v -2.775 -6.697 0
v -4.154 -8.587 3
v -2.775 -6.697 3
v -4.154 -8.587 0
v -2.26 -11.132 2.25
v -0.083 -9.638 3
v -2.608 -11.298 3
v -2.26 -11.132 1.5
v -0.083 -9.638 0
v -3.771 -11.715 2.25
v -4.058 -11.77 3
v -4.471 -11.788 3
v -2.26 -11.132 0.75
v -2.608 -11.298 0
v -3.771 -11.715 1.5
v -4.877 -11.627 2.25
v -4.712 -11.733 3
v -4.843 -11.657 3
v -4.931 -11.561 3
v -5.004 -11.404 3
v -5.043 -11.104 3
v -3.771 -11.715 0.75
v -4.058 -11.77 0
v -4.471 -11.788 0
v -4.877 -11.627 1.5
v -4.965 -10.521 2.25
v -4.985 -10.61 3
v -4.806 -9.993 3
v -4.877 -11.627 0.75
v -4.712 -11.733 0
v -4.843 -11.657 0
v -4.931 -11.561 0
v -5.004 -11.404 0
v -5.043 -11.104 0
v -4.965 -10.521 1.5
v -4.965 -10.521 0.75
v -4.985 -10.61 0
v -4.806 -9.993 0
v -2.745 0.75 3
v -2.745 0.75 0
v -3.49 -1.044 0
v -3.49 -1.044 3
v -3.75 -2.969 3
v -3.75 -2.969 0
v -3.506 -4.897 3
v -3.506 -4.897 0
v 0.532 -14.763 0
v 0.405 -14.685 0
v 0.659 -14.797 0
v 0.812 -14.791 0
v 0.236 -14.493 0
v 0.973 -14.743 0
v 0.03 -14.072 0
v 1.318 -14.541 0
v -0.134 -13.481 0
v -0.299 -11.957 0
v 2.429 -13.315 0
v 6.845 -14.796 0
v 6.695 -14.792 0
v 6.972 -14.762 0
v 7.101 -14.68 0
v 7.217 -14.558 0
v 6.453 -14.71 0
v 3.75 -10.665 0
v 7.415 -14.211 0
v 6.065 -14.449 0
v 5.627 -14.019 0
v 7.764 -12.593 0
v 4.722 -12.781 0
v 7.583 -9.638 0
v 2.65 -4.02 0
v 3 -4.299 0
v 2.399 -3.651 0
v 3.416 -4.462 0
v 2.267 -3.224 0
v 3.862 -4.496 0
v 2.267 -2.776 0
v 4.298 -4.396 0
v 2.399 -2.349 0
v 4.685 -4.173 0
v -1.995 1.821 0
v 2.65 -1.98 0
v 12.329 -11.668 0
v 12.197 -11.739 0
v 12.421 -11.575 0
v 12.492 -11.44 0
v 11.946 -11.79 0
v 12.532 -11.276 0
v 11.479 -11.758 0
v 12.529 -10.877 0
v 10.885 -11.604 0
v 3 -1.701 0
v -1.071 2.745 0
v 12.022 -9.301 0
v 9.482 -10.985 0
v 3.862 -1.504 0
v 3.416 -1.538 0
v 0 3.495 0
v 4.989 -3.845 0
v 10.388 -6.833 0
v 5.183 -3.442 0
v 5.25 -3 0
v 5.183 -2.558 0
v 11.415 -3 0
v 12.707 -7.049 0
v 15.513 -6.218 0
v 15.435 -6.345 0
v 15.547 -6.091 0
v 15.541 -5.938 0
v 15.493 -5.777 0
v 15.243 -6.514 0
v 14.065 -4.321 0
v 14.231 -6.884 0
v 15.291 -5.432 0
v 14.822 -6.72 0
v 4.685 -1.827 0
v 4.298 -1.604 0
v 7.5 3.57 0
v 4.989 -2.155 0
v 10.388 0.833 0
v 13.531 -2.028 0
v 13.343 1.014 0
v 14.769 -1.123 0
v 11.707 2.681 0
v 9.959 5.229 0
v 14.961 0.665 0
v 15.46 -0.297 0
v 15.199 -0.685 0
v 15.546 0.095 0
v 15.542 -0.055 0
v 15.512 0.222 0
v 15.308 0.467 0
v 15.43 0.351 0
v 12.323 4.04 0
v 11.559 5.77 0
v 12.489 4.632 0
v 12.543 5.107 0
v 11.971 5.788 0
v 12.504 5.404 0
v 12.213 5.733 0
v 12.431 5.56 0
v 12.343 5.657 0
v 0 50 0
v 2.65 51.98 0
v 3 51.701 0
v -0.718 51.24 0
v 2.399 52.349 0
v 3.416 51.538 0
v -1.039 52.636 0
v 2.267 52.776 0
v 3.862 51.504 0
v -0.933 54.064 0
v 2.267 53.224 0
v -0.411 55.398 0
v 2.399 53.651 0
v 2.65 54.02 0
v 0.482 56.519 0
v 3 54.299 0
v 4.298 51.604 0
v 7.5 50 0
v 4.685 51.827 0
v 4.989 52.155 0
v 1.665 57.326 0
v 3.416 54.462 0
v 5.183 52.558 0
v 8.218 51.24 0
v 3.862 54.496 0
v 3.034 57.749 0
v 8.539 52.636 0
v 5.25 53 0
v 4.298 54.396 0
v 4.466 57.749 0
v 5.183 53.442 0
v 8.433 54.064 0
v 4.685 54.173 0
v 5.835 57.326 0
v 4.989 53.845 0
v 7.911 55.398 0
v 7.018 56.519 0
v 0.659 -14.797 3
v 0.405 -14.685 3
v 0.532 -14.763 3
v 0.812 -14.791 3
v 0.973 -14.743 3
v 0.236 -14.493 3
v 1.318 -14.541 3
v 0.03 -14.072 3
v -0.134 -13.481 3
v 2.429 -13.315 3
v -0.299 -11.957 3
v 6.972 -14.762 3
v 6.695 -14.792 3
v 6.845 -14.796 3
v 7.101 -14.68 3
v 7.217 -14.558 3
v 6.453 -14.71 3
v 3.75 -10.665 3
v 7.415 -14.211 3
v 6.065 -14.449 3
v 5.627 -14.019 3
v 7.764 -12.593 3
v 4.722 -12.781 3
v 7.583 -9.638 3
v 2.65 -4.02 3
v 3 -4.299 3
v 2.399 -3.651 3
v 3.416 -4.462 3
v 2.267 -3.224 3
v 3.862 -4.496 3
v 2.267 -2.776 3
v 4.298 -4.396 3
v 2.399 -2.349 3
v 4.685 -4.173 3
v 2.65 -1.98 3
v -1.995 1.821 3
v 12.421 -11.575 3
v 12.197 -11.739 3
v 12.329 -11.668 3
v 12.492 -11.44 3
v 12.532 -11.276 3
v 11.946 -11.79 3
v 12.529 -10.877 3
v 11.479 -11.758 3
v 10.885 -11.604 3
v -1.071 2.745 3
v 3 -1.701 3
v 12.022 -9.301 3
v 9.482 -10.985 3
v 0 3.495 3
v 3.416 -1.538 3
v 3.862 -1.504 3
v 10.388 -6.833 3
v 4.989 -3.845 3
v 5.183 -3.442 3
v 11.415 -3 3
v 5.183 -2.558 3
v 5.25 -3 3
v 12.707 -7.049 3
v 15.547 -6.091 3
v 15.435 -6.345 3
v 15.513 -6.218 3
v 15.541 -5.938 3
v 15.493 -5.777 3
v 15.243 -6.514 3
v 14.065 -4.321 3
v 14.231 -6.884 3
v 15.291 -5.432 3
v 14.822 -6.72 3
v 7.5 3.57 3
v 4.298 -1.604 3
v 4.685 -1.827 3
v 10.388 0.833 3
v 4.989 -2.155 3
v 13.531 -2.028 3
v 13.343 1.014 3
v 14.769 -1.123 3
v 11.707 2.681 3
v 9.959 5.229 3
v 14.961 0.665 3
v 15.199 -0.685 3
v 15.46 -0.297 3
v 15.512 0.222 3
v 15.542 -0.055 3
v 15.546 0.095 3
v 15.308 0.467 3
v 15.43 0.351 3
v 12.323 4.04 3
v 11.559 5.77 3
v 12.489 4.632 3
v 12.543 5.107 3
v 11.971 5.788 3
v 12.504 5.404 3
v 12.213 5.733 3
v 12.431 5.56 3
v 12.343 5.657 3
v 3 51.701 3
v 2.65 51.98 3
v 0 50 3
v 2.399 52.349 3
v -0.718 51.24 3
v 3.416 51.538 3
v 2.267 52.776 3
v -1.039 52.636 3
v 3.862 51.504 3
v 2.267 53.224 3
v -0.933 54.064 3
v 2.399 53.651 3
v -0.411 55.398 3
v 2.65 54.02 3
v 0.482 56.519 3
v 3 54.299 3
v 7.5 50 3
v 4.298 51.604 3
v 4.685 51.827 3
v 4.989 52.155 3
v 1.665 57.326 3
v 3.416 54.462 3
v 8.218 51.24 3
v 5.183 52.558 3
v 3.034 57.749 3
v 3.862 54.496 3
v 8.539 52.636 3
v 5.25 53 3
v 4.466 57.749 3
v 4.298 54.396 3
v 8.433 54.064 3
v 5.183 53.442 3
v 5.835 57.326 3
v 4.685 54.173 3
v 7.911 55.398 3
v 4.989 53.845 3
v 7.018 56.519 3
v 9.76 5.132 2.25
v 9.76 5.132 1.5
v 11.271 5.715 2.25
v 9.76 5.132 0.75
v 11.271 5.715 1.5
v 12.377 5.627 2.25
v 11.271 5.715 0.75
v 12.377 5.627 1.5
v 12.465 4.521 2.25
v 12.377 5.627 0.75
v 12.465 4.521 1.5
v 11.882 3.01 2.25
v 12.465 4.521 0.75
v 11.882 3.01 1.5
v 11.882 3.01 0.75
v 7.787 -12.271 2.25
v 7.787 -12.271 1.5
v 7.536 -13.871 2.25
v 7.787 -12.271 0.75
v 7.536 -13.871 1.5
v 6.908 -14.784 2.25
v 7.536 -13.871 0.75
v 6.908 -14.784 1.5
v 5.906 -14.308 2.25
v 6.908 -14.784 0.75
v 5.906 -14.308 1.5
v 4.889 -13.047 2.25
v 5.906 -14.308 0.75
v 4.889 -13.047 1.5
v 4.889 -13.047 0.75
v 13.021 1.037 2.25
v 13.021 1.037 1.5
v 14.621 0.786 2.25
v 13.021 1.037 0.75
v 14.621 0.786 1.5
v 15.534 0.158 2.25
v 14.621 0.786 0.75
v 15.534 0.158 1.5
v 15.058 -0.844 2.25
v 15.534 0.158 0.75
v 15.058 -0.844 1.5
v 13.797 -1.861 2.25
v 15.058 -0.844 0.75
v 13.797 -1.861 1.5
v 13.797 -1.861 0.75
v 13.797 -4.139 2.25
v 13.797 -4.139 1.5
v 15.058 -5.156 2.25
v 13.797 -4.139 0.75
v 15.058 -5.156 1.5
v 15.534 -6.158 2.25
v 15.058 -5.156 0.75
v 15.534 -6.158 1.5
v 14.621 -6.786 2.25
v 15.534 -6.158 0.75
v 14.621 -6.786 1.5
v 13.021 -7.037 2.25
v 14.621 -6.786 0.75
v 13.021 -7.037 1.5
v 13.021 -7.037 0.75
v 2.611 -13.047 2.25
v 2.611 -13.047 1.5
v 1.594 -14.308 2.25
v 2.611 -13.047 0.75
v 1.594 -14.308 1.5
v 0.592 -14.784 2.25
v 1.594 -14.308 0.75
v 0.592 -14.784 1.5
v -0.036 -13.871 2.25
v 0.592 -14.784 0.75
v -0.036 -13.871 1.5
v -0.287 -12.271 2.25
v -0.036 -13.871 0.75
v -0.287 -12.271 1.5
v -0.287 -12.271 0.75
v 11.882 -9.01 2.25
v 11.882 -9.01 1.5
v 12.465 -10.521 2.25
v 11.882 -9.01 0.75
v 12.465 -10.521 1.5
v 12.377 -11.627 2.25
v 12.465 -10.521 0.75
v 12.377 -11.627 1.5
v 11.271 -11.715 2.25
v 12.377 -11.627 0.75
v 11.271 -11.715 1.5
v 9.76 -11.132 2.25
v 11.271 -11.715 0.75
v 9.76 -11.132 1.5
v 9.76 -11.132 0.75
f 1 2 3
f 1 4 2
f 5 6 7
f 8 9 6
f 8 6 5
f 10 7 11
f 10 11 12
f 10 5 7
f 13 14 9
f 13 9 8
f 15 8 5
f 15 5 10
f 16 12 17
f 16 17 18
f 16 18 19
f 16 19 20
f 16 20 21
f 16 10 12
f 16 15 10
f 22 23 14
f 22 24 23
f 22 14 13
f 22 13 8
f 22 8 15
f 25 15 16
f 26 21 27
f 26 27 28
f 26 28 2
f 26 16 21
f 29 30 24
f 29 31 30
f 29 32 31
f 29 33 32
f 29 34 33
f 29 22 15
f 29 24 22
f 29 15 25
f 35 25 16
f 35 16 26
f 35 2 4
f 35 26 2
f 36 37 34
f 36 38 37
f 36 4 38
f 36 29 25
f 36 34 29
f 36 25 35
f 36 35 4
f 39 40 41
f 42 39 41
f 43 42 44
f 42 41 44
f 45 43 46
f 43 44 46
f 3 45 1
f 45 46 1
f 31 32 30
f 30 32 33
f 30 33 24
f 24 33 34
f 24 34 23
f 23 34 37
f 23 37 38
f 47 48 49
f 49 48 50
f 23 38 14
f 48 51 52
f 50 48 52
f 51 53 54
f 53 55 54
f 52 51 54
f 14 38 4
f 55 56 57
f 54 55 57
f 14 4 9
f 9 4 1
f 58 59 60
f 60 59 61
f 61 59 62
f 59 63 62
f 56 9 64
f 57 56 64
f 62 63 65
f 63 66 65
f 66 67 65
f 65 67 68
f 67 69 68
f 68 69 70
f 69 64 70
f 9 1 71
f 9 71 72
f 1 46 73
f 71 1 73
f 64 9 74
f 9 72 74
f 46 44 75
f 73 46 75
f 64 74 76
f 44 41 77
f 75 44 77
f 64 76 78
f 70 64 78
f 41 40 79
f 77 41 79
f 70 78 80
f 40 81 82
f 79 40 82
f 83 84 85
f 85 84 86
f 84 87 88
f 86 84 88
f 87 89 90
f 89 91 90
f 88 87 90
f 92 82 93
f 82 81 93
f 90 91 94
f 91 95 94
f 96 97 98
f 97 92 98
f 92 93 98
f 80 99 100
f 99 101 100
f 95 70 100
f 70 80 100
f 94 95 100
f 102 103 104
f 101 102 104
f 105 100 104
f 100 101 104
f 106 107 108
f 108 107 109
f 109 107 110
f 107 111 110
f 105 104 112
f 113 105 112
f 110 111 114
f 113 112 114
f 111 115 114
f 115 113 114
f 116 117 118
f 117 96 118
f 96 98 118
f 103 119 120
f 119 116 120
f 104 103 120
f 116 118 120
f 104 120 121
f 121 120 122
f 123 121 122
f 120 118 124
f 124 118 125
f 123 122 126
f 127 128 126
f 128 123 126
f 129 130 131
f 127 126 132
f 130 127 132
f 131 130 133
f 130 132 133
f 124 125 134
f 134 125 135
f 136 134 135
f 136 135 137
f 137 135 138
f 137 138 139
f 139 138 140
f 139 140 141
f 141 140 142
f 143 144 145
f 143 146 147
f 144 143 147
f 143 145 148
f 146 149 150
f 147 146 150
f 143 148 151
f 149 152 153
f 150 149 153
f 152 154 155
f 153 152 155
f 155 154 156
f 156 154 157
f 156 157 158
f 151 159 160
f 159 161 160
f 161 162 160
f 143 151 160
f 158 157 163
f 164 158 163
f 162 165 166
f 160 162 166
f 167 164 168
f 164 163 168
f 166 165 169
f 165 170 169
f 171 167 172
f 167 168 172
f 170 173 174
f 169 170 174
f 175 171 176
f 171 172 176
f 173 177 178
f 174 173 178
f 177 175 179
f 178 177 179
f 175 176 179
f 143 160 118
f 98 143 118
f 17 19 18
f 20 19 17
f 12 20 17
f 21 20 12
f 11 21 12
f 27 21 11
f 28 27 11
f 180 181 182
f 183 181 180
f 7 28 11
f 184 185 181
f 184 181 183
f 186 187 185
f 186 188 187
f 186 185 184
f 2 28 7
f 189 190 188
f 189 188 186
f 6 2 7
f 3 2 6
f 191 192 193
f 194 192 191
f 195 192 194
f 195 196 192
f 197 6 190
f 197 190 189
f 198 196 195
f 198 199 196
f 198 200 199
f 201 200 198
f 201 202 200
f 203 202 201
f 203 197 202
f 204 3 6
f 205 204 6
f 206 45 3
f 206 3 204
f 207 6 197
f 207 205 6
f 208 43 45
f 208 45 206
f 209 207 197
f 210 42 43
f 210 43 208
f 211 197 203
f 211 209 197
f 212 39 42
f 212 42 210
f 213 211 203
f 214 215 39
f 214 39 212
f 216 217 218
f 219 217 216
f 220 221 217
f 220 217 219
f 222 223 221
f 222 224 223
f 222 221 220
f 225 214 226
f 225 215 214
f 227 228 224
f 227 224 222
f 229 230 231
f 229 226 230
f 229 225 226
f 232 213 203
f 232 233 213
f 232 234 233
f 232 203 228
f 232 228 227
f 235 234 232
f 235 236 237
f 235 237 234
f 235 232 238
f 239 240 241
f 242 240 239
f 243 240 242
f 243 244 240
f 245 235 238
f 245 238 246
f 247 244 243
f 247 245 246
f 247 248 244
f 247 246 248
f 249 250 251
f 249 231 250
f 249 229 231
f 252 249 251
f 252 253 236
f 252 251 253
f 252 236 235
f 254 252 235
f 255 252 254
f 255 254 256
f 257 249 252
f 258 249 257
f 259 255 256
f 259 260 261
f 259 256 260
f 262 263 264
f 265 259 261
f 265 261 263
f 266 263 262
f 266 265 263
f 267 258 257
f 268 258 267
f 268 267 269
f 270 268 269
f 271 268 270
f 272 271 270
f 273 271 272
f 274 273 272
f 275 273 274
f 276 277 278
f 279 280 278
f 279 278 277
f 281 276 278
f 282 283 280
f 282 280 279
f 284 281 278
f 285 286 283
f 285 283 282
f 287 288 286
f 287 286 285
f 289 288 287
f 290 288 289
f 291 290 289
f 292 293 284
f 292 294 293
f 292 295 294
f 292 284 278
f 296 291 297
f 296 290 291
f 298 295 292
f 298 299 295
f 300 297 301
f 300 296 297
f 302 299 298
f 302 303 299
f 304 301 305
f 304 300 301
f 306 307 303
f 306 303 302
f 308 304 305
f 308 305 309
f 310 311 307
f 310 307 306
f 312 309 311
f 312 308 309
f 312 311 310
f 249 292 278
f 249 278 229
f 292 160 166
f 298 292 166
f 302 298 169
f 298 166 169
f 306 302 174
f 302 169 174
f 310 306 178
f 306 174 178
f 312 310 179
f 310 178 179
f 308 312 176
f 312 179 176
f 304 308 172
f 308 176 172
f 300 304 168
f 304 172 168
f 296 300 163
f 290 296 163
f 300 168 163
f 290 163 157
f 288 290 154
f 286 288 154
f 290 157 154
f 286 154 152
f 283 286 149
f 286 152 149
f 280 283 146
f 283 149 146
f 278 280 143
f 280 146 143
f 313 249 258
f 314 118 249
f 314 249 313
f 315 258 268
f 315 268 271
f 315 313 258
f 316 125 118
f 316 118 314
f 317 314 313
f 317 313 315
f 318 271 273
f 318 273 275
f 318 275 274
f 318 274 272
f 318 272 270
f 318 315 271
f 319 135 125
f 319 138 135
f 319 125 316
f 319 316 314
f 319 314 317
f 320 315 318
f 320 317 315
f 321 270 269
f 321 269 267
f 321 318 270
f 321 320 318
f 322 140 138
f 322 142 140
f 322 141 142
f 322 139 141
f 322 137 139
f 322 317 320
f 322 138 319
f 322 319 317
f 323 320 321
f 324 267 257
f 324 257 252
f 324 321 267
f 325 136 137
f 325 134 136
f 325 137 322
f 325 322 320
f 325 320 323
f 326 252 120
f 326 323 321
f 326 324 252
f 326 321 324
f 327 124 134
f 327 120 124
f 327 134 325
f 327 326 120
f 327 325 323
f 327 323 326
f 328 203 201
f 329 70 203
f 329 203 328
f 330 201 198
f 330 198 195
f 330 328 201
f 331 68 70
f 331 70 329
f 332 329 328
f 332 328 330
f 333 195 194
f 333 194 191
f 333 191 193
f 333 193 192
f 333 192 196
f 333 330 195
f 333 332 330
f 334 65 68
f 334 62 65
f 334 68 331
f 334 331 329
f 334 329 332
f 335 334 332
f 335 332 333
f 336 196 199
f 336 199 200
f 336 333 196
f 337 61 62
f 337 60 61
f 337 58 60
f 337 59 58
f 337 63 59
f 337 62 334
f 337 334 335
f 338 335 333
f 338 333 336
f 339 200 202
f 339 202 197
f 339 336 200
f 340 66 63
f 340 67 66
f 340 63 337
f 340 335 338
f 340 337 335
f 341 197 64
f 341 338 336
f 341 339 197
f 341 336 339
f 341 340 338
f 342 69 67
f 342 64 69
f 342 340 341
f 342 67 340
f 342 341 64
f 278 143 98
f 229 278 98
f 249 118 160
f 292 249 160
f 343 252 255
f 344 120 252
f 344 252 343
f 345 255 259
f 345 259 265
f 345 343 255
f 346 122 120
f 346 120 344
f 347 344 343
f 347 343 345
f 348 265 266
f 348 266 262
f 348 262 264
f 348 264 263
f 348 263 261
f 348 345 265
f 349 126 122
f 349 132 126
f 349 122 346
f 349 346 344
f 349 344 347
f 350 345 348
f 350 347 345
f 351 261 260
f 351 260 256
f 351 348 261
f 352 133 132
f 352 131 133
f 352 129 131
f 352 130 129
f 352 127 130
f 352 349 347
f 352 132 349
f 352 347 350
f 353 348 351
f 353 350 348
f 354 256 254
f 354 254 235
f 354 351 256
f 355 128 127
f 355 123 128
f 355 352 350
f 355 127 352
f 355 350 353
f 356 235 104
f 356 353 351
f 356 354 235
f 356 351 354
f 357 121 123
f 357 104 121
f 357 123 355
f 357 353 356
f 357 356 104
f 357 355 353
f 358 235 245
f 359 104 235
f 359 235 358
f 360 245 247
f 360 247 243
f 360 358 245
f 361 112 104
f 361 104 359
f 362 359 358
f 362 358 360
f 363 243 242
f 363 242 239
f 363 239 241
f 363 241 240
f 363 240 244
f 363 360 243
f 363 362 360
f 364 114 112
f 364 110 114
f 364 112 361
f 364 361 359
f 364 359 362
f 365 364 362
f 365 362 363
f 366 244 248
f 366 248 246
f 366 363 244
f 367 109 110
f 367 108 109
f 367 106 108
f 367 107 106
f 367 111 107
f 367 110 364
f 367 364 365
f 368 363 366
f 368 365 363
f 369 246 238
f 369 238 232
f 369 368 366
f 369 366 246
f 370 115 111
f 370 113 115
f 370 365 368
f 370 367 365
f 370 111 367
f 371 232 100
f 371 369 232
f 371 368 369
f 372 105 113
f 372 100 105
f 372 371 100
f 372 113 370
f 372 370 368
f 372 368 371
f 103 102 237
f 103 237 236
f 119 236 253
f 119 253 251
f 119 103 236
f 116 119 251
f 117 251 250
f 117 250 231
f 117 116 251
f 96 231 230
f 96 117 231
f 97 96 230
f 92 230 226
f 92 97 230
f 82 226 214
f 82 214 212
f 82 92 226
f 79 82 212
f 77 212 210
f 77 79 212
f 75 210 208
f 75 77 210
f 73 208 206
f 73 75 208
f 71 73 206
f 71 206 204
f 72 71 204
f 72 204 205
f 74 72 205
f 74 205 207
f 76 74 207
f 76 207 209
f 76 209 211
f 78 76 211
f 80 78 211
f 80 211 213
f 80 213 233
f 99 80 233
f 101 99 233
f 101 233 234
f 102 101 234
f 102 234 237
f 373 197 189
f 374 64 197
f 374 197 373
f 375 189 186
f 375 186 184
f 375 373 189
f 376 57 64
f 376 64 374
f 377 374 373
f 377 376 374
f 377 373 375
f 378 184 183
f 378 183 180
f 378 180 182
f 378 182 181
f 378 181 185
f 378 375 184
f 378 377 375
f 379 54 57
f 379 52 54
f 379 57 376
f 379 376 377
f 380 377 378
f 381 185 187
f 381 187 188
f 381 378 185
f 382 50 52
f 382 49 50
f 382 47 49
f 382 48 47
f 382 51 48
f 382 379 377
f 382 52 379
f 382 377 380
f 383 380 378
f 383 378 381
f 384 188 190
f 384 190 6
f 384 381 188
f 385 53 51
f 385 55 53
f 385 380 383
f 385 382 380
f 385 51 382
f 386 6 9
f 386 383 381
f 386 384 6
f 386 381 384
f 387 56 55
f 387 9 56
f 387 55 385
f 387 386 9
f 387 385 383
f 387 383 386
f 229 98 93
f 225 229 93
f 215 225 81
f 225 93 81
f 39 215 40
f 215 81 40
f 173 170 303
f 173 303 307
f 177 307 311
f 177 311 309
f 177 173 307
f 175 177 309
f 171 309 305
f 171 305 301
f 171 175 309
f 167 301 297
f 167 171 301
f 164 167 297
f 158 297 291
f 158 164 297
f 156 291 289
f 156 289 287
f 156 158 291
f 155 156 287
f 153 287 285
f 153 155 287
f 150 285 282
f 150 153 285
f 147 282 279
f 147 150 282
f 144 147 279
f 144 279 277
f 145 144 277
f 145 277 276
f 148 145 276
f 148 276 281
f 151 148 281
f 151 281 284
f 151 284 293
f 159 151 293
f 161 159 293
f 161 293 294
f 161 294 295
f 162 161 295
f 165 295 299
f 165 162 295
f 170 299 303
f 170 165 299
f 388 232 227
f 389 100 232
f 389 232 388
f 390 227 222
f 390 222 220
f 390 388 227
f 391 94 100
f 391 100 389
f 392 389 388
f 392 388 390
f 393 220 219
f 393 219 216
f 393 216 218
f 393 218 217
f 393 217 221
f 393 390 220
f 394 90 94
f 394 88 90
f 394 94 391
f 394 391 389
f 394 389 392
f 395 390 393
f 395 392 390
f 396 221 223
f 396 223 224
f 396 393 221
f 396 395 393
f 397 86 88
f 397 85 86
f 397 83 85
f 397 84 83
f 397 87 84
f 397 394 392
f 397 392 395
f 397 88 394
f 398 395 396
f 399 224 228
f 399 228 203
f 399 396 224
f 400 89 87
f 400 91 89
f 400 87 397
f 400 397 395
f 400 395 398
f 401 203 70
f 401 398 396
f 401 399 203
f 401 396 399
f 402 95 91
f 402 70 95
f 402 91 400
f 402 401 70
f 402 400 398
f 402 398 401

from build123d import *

# Parameters (mm, degrees)
F0_R     = 1.5
F1_DEPTH = 3
F2_COUNT = 4
F2_ANGLE = 90
F3_DEPTH = 3


with BuildPart() as f1:
    # F0 (on Top) → F1 (new body)
    with BuildSketch(Plane.XY):
        with BuildLine():
            ThreePointArc((11.25, -3), (10.2451905284, 0.75), (7.5, 3.4951905284))
            ThreePointArc((7.5, 3.4951905284), (3.75, 4.5), (0, 3.4951905284))
            ThreePointArc((0, 3.4951905284), (-2.7603869175, -6.7235550465), (7.4470485127, -9.5254756374))
            ThreePointArc((7.4470485127, -9.5254756374), (9.0533008589, -8.3033008589), (10.2754756374, -6.6970485127))
            ThreePointArc((10.2754756374, -6.6970485127), (11.0022778243, -4.9116658598), (11.25, -3))
        make_face()
        with Locations((3.75, -3)):
            Circle(F0_R, mode=Mode.SUBTRACT)
        with BuildLine():
            ThreePointArc((10.2754756374, -6.6970485127), (9.0533008589, -8.3033008589), (7.4470485127, -9.5254756374))
            add(Edge.make_bspline(
                [(10.2754756374, -6.6970485127), (10.8307852997, -7.3634585229), (11.9260474334, -8.6778488518), (13.2146634909, -12.4646634909), (9.4278488518, -11.1760474334), (8.1134585229, -10.0807852997), (7.4470485127, -9.5254756374)],
                knots=[0, 0, 0, 0, 0.2535053688, 0.5, 0.7464946312, 1, 1, 1, 1], degree=3))
        make_face()
    extrude(amount=F1_DEPTH)

    # F2: F1 ×4 about axis, to both sides
    f2_axis = Axis((3.75, -3, 0), (0, 0, 1))


with BuildPart() as f1_1:
    add(f1.part)
    for i in range(1, F2_COUNT):
        add(f1.part.rotate(f2_axis, i * F2_ANGLE / (F2_COUNT - 1)))
        add(f1.part.rotate(f2_axis, -i * F2_ANGLE / (F2_COUNT - 1)))

    # F0 (on Top) → F3 (join)
    with BuildSketch(Plane.XY):
        with BuildLine():
            Line((7.5, 3.4951905284), (7.5, 50))
            ThreePointArc((7.5, 50), (3.75, 57.8023431781), (0, 50))
            Line((0, 50), (0, 3.4951905284))
            ThreePointArc((0, 3.4951905284), (3.75, 4.5), (7.5, 3.4951905284))
        make_face()
        with Locations((3.75, 53)):
            Circle(F0_R, mode=Mode.SUBTRACT)
    extrude(amount=F3_DEPTH)


solid = f1_1.part
